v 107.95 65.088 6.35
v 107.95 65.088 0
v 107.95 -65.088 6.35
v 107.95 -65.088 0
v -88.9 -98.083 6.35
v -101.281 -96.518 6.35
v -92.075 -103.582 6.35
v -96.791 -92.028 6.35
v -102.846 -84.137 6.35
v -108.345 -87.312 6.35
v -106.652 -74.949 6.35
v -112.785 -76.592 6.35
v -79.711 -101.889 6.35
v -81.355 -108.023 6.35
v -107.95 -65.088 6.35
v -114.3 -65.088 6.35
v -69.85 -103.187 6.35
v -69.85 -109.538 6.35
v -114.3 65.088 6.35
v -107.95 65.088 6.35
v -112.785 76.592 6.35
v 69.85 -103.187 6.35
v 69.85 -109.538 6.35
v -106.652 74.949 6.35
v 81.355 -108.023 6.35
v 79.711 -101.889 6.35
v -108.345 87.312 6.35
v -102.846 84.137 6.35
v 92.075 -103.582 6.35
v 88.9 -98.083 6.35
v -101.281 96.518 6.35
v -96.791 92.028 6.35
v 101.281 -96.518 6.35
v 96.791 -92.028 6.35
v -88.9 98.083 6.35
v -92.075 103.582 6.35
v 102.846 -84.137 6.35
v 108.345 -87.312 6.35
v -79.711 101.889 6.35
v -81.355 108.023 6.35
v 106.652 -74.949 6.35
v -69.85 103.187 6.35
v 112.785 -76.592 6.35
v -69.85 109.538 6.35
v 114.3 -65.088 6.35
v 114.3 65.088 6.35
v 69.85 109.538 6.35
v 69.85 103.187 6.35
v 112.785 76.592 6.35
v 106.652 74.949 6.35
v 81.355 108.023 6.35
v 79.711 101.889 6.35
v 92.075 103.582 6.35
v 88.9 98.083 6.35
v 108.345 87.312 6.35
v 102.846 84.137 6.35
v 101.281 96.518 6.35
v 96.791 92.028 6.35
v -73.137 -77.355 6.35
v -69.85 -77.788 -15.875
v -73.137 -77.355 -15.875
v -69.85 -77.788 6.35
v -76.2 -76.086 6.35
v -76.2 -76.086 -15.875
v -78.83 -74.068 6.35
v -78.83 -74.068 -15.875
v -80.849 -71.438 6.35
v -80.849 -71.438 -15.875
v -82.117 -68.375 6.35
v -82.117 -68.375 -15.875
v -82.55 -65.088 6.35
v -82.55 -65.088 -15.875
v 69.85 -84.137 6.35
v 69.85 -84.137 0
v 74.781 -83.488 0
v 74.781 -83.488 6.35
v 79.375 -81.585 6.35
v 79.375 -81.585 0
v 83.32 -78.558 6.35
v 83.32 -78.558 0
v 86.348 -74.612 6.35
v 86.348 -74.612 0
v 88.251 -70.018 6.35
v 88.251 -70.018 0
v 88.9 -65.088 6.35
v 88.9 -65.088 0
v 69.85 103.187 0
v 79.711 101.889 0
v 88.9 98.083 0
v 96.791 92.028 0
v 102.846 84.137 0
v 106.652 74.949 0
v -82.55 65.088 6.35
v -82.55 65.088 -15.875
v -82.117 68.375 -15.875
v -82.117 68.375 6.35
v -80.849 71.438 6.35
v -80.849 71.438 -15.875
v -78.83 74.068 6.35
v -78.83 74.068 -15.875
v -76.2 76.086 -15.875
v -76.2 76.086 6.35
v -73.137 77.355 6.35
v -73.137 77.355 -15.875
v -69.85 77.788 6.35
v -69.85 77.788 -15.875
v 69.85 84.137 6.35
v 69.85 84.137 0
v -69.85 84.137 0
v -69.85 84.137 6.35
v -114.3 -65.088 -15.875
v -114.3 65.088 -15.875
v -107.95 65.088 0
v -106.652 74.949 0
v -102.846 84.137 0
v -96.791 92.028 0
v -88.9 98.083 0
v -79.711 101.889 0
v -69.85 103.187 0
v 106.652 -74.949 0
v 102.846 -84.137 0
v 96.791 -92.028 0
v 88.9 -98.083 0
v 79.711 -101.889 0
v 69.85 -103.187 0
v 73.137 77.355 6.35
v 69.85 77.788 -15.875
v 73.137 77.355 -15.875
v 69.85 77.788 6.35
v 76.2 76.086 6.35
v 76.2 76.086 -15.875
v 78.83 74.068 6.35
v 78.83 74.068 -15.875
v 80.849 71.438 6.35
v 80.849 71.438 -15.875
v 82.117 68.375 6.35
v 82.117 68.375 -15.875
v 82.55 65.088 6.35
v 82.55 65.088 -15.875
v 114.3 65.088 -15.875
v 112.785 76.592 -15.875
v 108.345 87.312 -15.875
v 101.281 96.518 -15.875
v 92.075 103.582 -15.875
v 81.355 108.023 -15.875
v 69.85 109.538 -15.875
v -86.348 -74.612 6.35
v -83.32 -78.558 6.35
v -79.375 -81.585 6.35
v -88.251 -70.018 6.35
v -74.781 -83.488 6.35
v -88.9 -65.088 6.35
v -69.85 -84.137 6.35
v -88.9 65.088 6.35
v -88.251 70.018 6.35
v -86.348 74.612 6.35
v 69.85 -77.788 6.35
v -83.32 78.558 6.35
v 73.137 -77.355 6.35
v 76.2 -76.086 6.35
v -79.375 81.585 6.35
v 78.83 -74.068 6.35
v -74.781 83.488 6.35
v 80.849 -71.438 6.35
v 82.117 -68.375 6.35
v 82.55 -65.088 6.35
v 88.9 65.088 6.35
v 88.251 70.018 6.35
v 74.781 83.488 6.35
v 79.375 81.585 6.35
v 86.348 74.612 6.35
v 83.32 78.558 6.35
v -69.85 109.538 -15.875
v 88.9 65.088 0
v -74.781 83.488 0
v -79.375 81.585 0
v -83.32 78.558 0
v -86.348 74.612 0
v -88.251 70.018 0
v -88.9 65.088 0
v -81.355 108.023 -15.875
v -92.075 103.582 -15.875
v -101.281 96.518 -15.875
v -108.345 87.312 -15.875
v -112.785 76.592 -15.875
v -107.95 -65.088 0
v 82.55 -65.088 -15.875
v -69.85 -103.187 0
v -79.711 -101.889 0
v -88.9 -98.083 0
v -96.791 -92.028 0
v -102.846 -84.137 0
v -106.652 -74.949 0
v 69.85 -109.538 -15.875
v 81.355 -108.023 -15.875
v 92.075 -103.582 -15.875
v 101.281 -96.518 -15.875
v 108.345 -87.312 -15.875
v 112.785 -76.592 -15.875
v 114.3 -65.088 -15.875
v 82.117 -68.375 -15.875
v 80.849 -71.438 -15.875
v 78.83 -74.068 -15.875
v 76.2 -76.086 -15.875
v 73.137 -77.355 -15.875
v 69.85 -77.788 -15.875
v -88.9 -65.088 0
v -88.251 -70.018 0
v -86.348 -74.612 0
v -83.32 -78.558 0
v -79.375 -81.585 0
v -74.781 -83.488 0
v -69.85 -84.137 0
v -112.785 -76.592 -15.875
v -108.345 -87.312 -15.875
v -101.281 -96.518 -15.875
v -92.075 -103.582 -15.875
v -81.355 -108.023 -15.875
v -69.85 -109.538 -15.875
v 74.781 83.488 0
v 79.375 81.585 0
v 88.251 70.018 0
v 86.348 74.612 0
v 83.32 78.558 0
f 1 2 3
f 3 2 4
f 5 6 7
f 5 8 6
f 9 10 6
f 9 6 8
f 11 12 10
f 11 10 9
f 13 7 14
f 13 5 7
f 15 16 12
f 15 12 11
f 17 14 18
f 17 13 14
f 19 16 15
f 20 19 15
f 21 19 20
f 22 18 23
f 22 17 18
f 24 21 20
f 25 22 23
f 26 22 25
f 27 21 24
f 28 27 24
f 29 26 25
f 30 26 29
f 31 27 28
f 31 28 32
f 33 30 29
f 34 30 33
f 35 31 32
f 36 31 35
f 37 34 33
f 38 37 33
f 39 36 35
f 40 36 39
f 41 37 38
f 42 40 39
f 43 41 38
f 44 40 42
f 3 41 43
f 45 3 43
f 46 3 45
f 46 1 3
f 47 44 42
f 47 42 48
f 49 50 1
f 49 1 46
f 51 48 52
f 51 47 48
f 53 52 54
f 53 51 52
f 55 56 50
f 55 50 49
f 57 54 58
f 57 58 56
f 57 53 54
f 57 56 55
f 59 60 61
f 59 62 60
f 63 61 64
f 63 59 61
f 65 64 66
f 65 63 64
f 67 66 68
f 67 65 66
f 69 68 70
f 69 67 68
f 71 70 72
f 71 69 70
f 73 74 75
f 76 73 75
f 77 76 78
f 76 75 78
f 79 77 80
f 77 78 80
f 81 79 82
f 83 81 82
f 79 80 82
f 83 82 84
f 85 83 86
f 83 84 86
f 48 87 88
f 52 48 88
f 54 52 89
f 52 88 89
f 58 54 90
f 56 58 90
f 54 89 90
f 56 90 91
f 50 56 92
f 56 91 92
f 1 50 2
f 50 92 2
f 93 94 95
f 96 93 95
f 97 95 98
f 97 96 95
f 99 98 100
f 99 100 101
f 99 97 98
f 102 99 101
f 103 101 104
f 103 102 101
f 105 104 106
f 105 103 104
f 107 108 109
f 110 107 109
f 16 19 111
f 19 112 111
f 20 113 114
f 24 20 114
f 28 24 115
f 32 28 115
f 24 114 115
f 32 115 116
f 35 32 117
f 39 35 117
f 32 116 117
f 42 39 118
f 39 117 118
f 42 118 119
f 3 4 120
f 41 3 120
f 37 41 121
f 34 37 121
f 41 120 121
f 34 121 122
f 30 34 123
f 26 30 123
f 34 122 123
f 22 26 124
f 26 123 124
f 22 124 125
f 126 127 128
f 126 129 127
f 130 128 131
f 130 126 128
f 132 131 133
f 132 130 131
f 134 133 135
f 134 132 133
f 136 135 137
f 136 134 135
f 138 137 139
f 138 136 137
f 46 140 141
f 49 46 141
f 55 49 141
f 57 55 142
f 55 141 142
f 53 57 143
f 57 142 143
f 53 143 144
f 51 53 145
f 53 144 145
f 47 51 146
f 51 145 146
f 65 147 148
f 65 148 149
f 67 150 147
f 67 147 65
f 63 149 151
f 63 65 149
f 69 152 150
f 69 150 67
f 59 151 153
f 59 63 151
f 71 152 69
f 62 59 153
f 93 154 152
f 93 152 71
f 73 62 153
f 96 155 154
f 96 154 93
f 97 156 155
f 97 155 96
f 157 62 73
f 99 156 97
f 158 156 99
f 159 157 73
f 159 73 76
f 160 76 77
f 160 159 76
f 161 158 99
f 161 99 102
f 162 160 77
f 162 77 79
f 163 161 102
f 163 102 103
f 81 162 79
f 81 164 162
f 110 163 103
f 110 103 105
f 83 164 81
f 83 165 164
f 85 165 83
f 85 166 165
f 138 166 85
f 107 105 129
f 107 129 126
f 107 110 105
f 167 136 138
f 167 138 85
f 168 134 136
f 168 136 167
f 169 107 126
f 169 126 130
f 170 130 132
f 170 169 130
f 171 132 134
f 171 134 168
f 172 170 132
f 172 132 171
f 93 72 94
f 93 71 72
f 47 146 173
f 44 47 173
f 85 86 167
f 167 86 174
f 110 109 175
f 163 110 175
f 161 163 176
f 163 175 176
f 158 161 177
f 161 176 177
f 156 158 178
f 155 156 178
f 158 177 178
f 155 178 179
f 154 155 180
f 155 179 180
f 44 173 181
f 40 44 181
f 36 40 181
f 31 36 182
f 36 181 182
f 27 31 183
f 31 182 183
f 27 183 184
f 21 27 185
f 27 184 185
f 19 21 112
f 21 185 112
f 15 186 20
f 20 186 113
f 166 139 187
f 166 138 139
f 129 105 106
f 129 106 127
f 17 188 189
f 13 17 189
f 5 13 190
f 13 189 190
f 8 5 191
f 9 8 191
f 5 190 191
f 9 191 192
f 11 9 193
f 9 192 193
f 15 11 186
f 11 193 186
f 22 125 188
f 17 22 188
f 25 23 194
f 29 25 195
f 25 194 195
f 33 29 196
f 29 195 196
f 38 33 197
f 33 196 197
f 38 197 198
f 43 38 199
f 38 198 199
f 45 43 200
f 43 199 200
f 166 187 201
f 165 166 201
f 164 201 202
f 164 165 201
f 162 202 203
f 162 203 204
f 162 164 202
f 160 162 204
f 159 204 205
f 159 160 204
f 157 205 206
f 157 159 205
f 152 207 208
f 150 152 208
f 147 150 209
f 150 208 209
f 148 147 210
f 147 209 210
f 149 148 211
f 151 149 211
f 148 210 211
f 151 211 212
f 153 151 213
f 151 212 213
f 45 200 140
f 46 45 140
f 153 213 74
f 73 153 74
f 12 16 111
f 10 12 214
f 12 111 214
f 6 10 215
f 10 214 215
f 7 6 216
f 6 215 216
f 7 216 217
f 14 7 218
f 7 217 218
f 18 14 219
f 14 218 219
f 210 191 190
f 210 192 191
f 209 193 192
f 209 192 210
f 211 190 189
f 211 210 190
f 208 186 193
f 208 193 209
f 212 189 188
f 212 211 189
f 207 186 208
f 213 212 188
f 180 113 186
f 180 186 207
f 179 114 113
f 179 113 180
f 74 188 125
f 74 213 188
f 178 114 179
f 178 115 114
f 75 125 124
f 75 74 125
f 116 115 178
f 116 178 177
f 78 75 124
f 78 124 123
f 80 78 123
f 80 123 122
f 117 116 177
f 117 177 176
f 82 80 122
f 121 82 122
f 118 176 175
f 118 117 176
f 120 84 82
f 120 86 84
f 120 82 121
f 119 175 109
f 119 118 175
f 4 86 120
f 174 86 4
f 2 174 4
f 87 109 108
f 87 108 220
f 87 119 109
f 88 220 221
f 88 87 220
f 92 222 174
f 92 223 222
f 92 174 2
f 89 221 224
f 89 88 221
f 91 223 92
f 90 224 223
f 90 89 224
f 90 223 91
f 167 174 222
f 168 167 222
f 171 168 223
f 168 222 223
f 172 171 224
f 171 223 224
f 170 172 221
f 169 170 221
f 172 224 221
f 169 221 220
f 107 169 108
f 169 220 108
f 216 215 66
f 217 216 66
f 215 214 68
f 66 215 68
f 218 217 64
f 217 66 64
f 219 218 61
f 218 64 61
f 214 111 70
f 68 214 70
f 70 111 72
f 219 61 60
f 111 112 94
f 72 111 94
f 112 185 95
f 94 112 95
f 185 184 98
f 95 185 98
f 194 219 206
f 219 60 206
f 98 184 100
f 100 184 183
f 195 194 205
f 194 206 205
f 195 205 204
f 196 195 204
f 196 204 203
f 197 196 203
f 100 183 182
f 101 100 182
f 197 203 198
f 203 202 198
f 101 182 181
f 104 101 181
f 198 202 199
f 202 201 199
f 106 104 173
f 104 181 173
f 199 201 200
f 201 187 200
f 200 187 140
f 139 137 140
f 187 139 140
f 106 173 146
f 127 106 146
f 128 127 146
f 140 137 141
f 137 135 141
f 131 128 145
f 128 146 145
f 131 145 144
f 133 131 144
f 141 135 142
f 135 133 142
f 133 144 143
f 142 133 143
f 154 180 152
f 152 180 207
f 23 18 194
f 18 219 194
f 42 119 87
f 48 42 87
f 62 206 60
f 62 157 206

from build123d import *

# Parameters (mm, degrees)
F1_DEPTH = 15.875
F2_DEPTH = 9.525
F3_DEPTH = 6.35


with BuildPart() as f1:
    # F0 (on Top) → F1 (new body)
    with BuildSketch(Plane.XY):
        with BuildLine():
            ThreePointArc((-69.85, 109.5375), (-101.2808964237, 96.5183964237), (-114.3, 65.0875))
            Line((-114.3, 65.0875), (-114.3, -65.0875))
            ThreePointArc((-114.3, -65.0875), (-101.2808964237, -96.5183964237), (-69.85, -109.5375))
            Line((-69.85, -109.5375), (69.85, -109.5375))
            ThreePointArc((69.85, -109.5375), (101.2808964237, -96.5183964237), (114.3, -65.0875))
            Line((114.3, -65.0875), (114.3, 65.0875))
            ThreePointArc((114.3, 65.0875), (101.2808964237, 96.5183964237), (69.85, 109.5375))
            Line((69.85, 109.5375), (-69.85, 109.5375))
        make_face()
        with BuildLine():
            Line((-69.85, 103.187499407), (69.85, 103.187499407))
            ThreePointArc((69.85, 103.187499407), (96.7907679439, 92.0282679439), (107.949999407, 65.0875))
            Line((107.949999407, 65.0875), (107.949999407, -65.0875))
            ThreePointArc((107.949999407, -65.0875), (96.7907679439, -92.0282679439), (69.85, -103.187499407))
            Line((69.85, -103.187499407), (-69.85, -103.187499407))
            ThreePointArc((-69.85, -103.187499407), (-96.7907679439, -92.0282679439), (-107.949999407, -65.0875))
            Line((-107.949999407, -65.0875), (-107.949999407, 65.0875))
            ThreePointArc((-107.949999407, 65.0875), (-96.7907679439, 92.0282679439), (-69.85, 103.187499407))
        make_face(mode=Mode.SUBTRACT)
        with BuildLine():
            ThreePointArc((107.949999407, 65.0875), (96.7907679439, 92.0282679439), (69.85, 103.187499407))
            Line((69.85, 103.187499407), (-69.85, 103.187499407))
            ThreePointArc((-69.85, 103.187499407), (-96.7907679439, 92.0282679439), (-107.949999407, 65.0875))
            Line((-107.949999407, 65.0875), (-107.949999407, -65.0875))
            ThreePointArc((-107.949999407, -65.0875), (-96.7907679439, -92.0282679439), (-69.85, -103.187499407))
            Line((-69.85, -103.187499407), (69.85, -103.187499407))
            ThreePointArc((69.85, -103.187499407), (96.7907679439, -92.0282679439), (107.949999407, -65.0875))
            Line((107.949999407, -65.0875), (107.949999407, 65.0875))
        make_face()
        with BuildLine():
            Line((-107.187999407, -65.0875), (-107.187999407, 65.0875))
            ThreePointArc((-107.187999407, 65.0875), (-96.2519525766, 91.4894525766), (-69.85, 102.425499407))
            Line((-69.85, 102.425499407), (69.85, 102.425499407))
            ThreePointArc((69.85, 102.425499407), (96.2519525766, 91.4894525766), (107.187999407, 65.0875))
            Line((107.187999407, 65.0875), (107.187999407, -65.0875))
            ThreePointArc((107.187999407, -65.0875), (96.2519525766, -91.4894525766), (69.85, -102.425499407))
            Line((69.85, -102.425499407), (-69.85, -102.425499407))
            ThreePointArc((-69.85, -102.425499407), (-96.2519525766, -91.4894525766), (-107.187999407, -65.0875))
        make_face(mode=Mode.SUBTRACT)
        with BuildLine():
            ThreePointArc((-69.85, 102.425499407), (-96.2519525766, 91.4894525766), (-107.187999407, 65.0875))
            Line((-107.187999407, 65.0875), (-107.187999407, -65.0875))
            ThreePointArc((-107.187999407, -65.0875), (-96.2519525766, -91.4894525766), (-69.85, -102.425499407))
            Line((-69.85, -102.425499407), (69.85, -102.425499407))
            ThreePointArc((69.85, -102.425499407), (96.2519525766, -91.4894525766), (107.187999407, -65.0875))
            Line((107.187999407, -65.0875), (107.187999407, 65.0875))
            ThreePointArc((107.187999407, 65.0875), (96.2519525766, 91.4894525766), (69.85, 102.425499407))
            Line((69.85, 102.425499407), (-69.85, 102.425499407))
        make_face()
        with BuildLine():
            Line((-89.662, -65.0875), (-89.662, 65.0875))
            ThreePointArc((-89.662, 65.0875), (-83.8591995489, 79.0966995489), (-69.85, 84.8995))
            Line((-69.85, 84.8995), (69.85, 84.8995))
            ThreePointArc((69.85, 84.8995), (83.8591995489, 79.0966995489), (89.662, 65.0875))
            Line((89.662, 65.0875), (89.662, -65.0875))
            ThreePointArc((89.662, -65.0875), (83.8591995489, -79.0966995489), (69.85, -84.8995))
            Line((69.85, -84.8995), (-69.85, -84.8995))
            ThreePointArc((-69.85, -84.8995), (-83.8591995489, -79.0966995489), (-89.662, -65.0875))
        make_face(mode=Mode.SUBTRACT)
        with BuildLine():
            ThreePointArc((-69.85, 84.8995), (-83.8591995489, 79.0966995489), (-89.662, 65.0875))
            Line((-89.662, 65.0875), (-89.662, -65.0875))
            ThreePointArc((-89.662, -65.0875), (-83.8591995489, -79.0966995489), (-69.85, -84.8995))
            Line((-69.85, -84.8995), (69.85, -84.8995))
            ThreePointArc((69.85, -84.8995), (83.8591995489, -79.0966995489), (89.662, -65.0875))
            Line((89.662, -65.0875), (89.662, 65.0875))
            ThreePointArc((89.662, 65.0875), (83.8591995489, 79.0966995489), (69.85, 84.8995))
            Line((69.85, 84.8995), (-69.85, 84.8995))
        make_face()
        with BuildLine():
            ThreePointArc((-88.9, 65.0875), (-83.3203841816, 78.5578841816), (-69.85, 84.1375))
            Line((-69.85, 84.1375), (69.85, 84.1375))
            ThreePointArc((69.85, 84.1375), (83.3203841816, 78.5578841816), (88.9, 65.0875))
            Line((88.9, 65.0875), (88.9, -65.0875))
            ThreePointArc((88.9, -65.0875), (83.3203841816, -78.5578841816), (69.85, -84.1375))
            Line((69.85, -84.1375), (-69.85, -84.1375))
            ThreePointArc((-69.85, -84.1375), (-83.3203841816, -78.5578841816), (-88.9, -65.0875))
            Line((-88.9, -65.0875), (-88.9, 65.0875))
        make_face(mode=Mode.SUBTRACT)
        with BuildLine():
            Line((69.85, 84.1375), (-69.85, 84.1375))
            ThreePointArc((-69.85, 84.1375), (-83.3203841816, 78.5578841816), (-88.9, 65.0875))
            Line((-88.9, 65.0875), (-88.9, -65.0875))
            ThreePointArc((-88.9, -65.0875), (-83.3203841816, -78.5578841816), (-69.85, -84.1375))
            Line((-69.85, -84.1375), (69.85, -84.1375))
            ThreePointArc((69.85, -84.1375), (83.3203841816, -78.5578841816), (88.9, -65.0875))
            Line((88.9, -65.0875), (88.9, 65.0875))
            ThreePointArc((88.9, 65.0875), (83.3203841816, 78.5578841816), (69.85, 84.1375))
        make_face()
        with BuildLine():
            Line((-69.85, 77.7875), (69.85, 77.7875))
            ThreePointArc((69.85, 77.7875), (78.8302561211, 74.0677561211), (82.55, 65.0875))
            Line((82.55, 65.0875), (82.55, -65.0875))
            ThreePointArc((82.55, -65.0875), (78.8302561211, -74.0677561211), (69.85, -77.7875))
            Line((69.85, -77.7875), (-69.85, -77.7875))
            ThreePointArc((-69.85, -77.7875), (-78.8302561211, -74.0677561211), (-82.55, -65.0875))
            Line((-82.55, -65.0875), (-82.55, 65.0875))
            ThreePointArc((-82.55, 65.0875), (-78.8302561211, 74.0677561211), (-69.85, 77.7875))
        make_face(mode=Mode.SUBTRACT)
    extrude(amount=-F1_DEPTH)

    # F0 (on Top) → F2 (cut)
    with BuildSketch(Plane.XY):
        with BuildLine():
            ThreePointArc((107.949999407, 65.0875), (96.7907679439, 92.0282679439), (69.85, 103.187499407))
            Line((69.85, 103.187499407), (-69.85, 103.187499407))
            ThreePointArc((-69.85, 103.187499407), (-96.7907679439, 92.0282679439), (-107.949999407, 65.0875))
            Line((-107.949999407, 65.0875), (-107.949999407, -65.0875))
            ThreePointArc((-107.949999407, -65.0875), (-96.7907679439, -92.0282679439), (-69.85, -103.187499407))
            Line((-69.85, -103.187499407), (69.85, -103.187499407))
            ThreePointArc((69.85, -103.187499407), (96.7907679439, -92.0282679439), (107.949999407, -65.0875))
            Line((107.949999407, -65.0875), (107.949999407, 65.0875))
        make_face()
        with BuildLine():
            Line((-107.187999407, -65.0875), (-107.187999407, 65.0875))
            ThreePointArc((-107.187999407, 65.0875), (-96.2519525766, 91.4894525766), (-69.85, 102.425499407))
            Line((-69.85, 102.425499407), (69.85, 102.425499407))
            ThreePointArc((69.85, 102.425499407), (96.2519525766, 91.4894525766), (107.187999407, 65.0875))
            Line((107.187999407, 65.0875), (107.187999407, -65.0875))
            ThreePointArc((107.187999407, -65.0875), (96.2519525766, -91.4894525766), (69.85, -102.425499407))
            Line((69.85, -102.425499407), (-69.85, -102.425499407))
            ThreePointArc((-69.85, -102.425499407), (-96.2519525766, -91.4894525766), (-107.187999407, -65.0875))
        make_face(mode=Mode.SUBTRACT)
        with BuildLine():
            ThreePointArc((-69.85, 102.425499407), (-96.2519525766, 91.4894525766), (-107.187999407, 65.0875))
            Line((-107.187999407, 65.0875), (-107.187999407, -65.0875))
            ThreePointArc((-107.187999407, -65.0875), (-96.2519525766, -91.4894525766), (-69.85, -102.425499407))
            Line((-69.85, -102.425499407), (69.85, -102.425499407))
            ThreePointArc((69.85, -102.425499407), (96.2519525766, -91.4894525766), (107.187999407, -65.0875))
            Line((107.187999407, -65.0875), (107.187999407, 65.0875))
            ThreePointArc((107.187999407, 65.0875), (96.2519525766, 91.4894525766), (69.85, 102.425499407))
            Line((69.85, 102.425499407), (-69.85, 102.425499407))
        make_face()
        with BuildLine():
            Line((-89.662, -65.0875), (-89.662, 65.0875))
            ThreePointArc((-89.662, 65.0875), (-83.8591995489, 79.0966995489), (-69.85, 84.8995))
            Line((-69.85, 84.8995), (69.85, 84.8995))
            ThreePointArc((69.85, 84.8995), (83.8591995489, 79.0966995489), (89.662, 65.0875))
            Line((89.662, 65.0875), (89.662, -65.0875))
            ThreePointArc((89.662, -65.0875), (83.8591995489, -79.0966995489), (69.85, -84.8995))
            Line((69.85, -84.8995), (-69.85, -84.8995))
            ThreePointArc((-69.85, -84.8995), (-83.8591995489, -79.0966995489), (-89.662, -65.0875))
        make_face(mode=Mode.SUBTRACT)
    extrude(amount=F2_DEPTH, mode=Mode.SUBTRACT)

    # F0 (on Top) → F3 (join)
    with BuildSketch(Plane.XY):
        with BuildLine():
            ThreePointArc((-69.85, 109.5375), (-101.2808964237, 96.5183964237), (-114.3, 65.0875))
            Line((-114.3, 65.0875), (-114.3, -65.0875))
            ThreePointArc((-114.3, -65.0875), (-101.2808964237, -96.5183964237), (-69.85, -109.5375))
            Line((-69.85, -109.5375), (69.85, -109.5375))
            ThreePointArc((69.85, -109.5375), (101.2808964237, -96.5183964237), (114.3, -65.0875))
            Line((114.3, -65.0875), (114.3, 65.0875))
            ThreePointArc((114.3, 65.0875), (101.2808964237, 96.5183964237), (69.85, 109.5375))
            Line((69.85, 109.5375), (-69.85, 109.5375))
        make_face()
        with BuildLine():
            Line((-69.85, 103.187499407), (69.85, 103.187499407))
            ThreePointArc((69.85, 103.187499407), (96.7907679439, 92.0282679439), (107.949999407, 65.0875))
            Line((107.949999407, 65.0875), (107.949999407, -65.0875))
            ThreePointArc((107.949999407, -65.0875), (96.7907679439, -92.0282679439), (69.85, -103.187499407))
            Line((69.85, -103.187499407), (-69.85, -103.187499407))
            ThreePointArc((-69.85, -103.187499407), (-96.7907679439, -92.0282679439), (-107.949999407, -65.0875))
            Line((-107.949999407, -65.0875), (-107.949999407, 65.0875))
            ThreePointArc((-107.949999407, 65.0875), (-96.7907679439, 92.0282679439), (-69.85, 103.187499407))
        make_face(mode=Mode.SUBTRACT)
        with BuildLine():
            Line((69.85, 84.1375), (-69.85, 84.1375))
            ThreePointArc((-69.85, 84.1375), (-83.3203841816, 78.5578841816), (-88.9, 65.0875))
            Line((-88.9, 65.0875), (-88.9, -65.0875))
            ThreePointArc((-88.9, -65.0875), (-83.3203841816, -78.5578841816), (-69.85, -84.1375))
            Line((-69.85, -84.1375), (69.85, -84.1375))
            ThreePointArc((69.85, -84.1375), (83.3203841816, -78.5578841816), (88.9, -65.0875))
            Line((88.9, -65.0875), (88.9, 65.0875))
            ThreePointArc((88.9, 65.0875), (83.3203841816, 78.5578841816), (69.85, 84.1375))
        make_face()
        with BuildLine():
            Line((-69.85, 77.7875), (69.85, 77.7875))
            ThreePointArc((69.85, 77.7875), (78.8302561211, 74.0677561211), (82.55, 65.0875))
            Line((82.55, 65.0875), (82.55, -65.0875))
            ThreePointArc((82.55, -65.0875), (78.8302561211, -74.0677561211), (69.85, -77.7875))
            Line((69.85, -77.7875), (-69.85, -77.7875))
            ThreePointArc((-69.85, -77.7875), (-78.8302561211, -74.0677561211), (-82.55, -65.0875))
            Line((-82.55, -65.0875), (-82.55, 65.0875))
            ThreePointArc((-82.55, 65.0875), (-78.8302561211, 74.0677561211), (-69.85, 77.7875))
        make_face(mode=Mode.SUBTRACT)
    extrude(amount=F3_DEPTH)


solid = f1.part
